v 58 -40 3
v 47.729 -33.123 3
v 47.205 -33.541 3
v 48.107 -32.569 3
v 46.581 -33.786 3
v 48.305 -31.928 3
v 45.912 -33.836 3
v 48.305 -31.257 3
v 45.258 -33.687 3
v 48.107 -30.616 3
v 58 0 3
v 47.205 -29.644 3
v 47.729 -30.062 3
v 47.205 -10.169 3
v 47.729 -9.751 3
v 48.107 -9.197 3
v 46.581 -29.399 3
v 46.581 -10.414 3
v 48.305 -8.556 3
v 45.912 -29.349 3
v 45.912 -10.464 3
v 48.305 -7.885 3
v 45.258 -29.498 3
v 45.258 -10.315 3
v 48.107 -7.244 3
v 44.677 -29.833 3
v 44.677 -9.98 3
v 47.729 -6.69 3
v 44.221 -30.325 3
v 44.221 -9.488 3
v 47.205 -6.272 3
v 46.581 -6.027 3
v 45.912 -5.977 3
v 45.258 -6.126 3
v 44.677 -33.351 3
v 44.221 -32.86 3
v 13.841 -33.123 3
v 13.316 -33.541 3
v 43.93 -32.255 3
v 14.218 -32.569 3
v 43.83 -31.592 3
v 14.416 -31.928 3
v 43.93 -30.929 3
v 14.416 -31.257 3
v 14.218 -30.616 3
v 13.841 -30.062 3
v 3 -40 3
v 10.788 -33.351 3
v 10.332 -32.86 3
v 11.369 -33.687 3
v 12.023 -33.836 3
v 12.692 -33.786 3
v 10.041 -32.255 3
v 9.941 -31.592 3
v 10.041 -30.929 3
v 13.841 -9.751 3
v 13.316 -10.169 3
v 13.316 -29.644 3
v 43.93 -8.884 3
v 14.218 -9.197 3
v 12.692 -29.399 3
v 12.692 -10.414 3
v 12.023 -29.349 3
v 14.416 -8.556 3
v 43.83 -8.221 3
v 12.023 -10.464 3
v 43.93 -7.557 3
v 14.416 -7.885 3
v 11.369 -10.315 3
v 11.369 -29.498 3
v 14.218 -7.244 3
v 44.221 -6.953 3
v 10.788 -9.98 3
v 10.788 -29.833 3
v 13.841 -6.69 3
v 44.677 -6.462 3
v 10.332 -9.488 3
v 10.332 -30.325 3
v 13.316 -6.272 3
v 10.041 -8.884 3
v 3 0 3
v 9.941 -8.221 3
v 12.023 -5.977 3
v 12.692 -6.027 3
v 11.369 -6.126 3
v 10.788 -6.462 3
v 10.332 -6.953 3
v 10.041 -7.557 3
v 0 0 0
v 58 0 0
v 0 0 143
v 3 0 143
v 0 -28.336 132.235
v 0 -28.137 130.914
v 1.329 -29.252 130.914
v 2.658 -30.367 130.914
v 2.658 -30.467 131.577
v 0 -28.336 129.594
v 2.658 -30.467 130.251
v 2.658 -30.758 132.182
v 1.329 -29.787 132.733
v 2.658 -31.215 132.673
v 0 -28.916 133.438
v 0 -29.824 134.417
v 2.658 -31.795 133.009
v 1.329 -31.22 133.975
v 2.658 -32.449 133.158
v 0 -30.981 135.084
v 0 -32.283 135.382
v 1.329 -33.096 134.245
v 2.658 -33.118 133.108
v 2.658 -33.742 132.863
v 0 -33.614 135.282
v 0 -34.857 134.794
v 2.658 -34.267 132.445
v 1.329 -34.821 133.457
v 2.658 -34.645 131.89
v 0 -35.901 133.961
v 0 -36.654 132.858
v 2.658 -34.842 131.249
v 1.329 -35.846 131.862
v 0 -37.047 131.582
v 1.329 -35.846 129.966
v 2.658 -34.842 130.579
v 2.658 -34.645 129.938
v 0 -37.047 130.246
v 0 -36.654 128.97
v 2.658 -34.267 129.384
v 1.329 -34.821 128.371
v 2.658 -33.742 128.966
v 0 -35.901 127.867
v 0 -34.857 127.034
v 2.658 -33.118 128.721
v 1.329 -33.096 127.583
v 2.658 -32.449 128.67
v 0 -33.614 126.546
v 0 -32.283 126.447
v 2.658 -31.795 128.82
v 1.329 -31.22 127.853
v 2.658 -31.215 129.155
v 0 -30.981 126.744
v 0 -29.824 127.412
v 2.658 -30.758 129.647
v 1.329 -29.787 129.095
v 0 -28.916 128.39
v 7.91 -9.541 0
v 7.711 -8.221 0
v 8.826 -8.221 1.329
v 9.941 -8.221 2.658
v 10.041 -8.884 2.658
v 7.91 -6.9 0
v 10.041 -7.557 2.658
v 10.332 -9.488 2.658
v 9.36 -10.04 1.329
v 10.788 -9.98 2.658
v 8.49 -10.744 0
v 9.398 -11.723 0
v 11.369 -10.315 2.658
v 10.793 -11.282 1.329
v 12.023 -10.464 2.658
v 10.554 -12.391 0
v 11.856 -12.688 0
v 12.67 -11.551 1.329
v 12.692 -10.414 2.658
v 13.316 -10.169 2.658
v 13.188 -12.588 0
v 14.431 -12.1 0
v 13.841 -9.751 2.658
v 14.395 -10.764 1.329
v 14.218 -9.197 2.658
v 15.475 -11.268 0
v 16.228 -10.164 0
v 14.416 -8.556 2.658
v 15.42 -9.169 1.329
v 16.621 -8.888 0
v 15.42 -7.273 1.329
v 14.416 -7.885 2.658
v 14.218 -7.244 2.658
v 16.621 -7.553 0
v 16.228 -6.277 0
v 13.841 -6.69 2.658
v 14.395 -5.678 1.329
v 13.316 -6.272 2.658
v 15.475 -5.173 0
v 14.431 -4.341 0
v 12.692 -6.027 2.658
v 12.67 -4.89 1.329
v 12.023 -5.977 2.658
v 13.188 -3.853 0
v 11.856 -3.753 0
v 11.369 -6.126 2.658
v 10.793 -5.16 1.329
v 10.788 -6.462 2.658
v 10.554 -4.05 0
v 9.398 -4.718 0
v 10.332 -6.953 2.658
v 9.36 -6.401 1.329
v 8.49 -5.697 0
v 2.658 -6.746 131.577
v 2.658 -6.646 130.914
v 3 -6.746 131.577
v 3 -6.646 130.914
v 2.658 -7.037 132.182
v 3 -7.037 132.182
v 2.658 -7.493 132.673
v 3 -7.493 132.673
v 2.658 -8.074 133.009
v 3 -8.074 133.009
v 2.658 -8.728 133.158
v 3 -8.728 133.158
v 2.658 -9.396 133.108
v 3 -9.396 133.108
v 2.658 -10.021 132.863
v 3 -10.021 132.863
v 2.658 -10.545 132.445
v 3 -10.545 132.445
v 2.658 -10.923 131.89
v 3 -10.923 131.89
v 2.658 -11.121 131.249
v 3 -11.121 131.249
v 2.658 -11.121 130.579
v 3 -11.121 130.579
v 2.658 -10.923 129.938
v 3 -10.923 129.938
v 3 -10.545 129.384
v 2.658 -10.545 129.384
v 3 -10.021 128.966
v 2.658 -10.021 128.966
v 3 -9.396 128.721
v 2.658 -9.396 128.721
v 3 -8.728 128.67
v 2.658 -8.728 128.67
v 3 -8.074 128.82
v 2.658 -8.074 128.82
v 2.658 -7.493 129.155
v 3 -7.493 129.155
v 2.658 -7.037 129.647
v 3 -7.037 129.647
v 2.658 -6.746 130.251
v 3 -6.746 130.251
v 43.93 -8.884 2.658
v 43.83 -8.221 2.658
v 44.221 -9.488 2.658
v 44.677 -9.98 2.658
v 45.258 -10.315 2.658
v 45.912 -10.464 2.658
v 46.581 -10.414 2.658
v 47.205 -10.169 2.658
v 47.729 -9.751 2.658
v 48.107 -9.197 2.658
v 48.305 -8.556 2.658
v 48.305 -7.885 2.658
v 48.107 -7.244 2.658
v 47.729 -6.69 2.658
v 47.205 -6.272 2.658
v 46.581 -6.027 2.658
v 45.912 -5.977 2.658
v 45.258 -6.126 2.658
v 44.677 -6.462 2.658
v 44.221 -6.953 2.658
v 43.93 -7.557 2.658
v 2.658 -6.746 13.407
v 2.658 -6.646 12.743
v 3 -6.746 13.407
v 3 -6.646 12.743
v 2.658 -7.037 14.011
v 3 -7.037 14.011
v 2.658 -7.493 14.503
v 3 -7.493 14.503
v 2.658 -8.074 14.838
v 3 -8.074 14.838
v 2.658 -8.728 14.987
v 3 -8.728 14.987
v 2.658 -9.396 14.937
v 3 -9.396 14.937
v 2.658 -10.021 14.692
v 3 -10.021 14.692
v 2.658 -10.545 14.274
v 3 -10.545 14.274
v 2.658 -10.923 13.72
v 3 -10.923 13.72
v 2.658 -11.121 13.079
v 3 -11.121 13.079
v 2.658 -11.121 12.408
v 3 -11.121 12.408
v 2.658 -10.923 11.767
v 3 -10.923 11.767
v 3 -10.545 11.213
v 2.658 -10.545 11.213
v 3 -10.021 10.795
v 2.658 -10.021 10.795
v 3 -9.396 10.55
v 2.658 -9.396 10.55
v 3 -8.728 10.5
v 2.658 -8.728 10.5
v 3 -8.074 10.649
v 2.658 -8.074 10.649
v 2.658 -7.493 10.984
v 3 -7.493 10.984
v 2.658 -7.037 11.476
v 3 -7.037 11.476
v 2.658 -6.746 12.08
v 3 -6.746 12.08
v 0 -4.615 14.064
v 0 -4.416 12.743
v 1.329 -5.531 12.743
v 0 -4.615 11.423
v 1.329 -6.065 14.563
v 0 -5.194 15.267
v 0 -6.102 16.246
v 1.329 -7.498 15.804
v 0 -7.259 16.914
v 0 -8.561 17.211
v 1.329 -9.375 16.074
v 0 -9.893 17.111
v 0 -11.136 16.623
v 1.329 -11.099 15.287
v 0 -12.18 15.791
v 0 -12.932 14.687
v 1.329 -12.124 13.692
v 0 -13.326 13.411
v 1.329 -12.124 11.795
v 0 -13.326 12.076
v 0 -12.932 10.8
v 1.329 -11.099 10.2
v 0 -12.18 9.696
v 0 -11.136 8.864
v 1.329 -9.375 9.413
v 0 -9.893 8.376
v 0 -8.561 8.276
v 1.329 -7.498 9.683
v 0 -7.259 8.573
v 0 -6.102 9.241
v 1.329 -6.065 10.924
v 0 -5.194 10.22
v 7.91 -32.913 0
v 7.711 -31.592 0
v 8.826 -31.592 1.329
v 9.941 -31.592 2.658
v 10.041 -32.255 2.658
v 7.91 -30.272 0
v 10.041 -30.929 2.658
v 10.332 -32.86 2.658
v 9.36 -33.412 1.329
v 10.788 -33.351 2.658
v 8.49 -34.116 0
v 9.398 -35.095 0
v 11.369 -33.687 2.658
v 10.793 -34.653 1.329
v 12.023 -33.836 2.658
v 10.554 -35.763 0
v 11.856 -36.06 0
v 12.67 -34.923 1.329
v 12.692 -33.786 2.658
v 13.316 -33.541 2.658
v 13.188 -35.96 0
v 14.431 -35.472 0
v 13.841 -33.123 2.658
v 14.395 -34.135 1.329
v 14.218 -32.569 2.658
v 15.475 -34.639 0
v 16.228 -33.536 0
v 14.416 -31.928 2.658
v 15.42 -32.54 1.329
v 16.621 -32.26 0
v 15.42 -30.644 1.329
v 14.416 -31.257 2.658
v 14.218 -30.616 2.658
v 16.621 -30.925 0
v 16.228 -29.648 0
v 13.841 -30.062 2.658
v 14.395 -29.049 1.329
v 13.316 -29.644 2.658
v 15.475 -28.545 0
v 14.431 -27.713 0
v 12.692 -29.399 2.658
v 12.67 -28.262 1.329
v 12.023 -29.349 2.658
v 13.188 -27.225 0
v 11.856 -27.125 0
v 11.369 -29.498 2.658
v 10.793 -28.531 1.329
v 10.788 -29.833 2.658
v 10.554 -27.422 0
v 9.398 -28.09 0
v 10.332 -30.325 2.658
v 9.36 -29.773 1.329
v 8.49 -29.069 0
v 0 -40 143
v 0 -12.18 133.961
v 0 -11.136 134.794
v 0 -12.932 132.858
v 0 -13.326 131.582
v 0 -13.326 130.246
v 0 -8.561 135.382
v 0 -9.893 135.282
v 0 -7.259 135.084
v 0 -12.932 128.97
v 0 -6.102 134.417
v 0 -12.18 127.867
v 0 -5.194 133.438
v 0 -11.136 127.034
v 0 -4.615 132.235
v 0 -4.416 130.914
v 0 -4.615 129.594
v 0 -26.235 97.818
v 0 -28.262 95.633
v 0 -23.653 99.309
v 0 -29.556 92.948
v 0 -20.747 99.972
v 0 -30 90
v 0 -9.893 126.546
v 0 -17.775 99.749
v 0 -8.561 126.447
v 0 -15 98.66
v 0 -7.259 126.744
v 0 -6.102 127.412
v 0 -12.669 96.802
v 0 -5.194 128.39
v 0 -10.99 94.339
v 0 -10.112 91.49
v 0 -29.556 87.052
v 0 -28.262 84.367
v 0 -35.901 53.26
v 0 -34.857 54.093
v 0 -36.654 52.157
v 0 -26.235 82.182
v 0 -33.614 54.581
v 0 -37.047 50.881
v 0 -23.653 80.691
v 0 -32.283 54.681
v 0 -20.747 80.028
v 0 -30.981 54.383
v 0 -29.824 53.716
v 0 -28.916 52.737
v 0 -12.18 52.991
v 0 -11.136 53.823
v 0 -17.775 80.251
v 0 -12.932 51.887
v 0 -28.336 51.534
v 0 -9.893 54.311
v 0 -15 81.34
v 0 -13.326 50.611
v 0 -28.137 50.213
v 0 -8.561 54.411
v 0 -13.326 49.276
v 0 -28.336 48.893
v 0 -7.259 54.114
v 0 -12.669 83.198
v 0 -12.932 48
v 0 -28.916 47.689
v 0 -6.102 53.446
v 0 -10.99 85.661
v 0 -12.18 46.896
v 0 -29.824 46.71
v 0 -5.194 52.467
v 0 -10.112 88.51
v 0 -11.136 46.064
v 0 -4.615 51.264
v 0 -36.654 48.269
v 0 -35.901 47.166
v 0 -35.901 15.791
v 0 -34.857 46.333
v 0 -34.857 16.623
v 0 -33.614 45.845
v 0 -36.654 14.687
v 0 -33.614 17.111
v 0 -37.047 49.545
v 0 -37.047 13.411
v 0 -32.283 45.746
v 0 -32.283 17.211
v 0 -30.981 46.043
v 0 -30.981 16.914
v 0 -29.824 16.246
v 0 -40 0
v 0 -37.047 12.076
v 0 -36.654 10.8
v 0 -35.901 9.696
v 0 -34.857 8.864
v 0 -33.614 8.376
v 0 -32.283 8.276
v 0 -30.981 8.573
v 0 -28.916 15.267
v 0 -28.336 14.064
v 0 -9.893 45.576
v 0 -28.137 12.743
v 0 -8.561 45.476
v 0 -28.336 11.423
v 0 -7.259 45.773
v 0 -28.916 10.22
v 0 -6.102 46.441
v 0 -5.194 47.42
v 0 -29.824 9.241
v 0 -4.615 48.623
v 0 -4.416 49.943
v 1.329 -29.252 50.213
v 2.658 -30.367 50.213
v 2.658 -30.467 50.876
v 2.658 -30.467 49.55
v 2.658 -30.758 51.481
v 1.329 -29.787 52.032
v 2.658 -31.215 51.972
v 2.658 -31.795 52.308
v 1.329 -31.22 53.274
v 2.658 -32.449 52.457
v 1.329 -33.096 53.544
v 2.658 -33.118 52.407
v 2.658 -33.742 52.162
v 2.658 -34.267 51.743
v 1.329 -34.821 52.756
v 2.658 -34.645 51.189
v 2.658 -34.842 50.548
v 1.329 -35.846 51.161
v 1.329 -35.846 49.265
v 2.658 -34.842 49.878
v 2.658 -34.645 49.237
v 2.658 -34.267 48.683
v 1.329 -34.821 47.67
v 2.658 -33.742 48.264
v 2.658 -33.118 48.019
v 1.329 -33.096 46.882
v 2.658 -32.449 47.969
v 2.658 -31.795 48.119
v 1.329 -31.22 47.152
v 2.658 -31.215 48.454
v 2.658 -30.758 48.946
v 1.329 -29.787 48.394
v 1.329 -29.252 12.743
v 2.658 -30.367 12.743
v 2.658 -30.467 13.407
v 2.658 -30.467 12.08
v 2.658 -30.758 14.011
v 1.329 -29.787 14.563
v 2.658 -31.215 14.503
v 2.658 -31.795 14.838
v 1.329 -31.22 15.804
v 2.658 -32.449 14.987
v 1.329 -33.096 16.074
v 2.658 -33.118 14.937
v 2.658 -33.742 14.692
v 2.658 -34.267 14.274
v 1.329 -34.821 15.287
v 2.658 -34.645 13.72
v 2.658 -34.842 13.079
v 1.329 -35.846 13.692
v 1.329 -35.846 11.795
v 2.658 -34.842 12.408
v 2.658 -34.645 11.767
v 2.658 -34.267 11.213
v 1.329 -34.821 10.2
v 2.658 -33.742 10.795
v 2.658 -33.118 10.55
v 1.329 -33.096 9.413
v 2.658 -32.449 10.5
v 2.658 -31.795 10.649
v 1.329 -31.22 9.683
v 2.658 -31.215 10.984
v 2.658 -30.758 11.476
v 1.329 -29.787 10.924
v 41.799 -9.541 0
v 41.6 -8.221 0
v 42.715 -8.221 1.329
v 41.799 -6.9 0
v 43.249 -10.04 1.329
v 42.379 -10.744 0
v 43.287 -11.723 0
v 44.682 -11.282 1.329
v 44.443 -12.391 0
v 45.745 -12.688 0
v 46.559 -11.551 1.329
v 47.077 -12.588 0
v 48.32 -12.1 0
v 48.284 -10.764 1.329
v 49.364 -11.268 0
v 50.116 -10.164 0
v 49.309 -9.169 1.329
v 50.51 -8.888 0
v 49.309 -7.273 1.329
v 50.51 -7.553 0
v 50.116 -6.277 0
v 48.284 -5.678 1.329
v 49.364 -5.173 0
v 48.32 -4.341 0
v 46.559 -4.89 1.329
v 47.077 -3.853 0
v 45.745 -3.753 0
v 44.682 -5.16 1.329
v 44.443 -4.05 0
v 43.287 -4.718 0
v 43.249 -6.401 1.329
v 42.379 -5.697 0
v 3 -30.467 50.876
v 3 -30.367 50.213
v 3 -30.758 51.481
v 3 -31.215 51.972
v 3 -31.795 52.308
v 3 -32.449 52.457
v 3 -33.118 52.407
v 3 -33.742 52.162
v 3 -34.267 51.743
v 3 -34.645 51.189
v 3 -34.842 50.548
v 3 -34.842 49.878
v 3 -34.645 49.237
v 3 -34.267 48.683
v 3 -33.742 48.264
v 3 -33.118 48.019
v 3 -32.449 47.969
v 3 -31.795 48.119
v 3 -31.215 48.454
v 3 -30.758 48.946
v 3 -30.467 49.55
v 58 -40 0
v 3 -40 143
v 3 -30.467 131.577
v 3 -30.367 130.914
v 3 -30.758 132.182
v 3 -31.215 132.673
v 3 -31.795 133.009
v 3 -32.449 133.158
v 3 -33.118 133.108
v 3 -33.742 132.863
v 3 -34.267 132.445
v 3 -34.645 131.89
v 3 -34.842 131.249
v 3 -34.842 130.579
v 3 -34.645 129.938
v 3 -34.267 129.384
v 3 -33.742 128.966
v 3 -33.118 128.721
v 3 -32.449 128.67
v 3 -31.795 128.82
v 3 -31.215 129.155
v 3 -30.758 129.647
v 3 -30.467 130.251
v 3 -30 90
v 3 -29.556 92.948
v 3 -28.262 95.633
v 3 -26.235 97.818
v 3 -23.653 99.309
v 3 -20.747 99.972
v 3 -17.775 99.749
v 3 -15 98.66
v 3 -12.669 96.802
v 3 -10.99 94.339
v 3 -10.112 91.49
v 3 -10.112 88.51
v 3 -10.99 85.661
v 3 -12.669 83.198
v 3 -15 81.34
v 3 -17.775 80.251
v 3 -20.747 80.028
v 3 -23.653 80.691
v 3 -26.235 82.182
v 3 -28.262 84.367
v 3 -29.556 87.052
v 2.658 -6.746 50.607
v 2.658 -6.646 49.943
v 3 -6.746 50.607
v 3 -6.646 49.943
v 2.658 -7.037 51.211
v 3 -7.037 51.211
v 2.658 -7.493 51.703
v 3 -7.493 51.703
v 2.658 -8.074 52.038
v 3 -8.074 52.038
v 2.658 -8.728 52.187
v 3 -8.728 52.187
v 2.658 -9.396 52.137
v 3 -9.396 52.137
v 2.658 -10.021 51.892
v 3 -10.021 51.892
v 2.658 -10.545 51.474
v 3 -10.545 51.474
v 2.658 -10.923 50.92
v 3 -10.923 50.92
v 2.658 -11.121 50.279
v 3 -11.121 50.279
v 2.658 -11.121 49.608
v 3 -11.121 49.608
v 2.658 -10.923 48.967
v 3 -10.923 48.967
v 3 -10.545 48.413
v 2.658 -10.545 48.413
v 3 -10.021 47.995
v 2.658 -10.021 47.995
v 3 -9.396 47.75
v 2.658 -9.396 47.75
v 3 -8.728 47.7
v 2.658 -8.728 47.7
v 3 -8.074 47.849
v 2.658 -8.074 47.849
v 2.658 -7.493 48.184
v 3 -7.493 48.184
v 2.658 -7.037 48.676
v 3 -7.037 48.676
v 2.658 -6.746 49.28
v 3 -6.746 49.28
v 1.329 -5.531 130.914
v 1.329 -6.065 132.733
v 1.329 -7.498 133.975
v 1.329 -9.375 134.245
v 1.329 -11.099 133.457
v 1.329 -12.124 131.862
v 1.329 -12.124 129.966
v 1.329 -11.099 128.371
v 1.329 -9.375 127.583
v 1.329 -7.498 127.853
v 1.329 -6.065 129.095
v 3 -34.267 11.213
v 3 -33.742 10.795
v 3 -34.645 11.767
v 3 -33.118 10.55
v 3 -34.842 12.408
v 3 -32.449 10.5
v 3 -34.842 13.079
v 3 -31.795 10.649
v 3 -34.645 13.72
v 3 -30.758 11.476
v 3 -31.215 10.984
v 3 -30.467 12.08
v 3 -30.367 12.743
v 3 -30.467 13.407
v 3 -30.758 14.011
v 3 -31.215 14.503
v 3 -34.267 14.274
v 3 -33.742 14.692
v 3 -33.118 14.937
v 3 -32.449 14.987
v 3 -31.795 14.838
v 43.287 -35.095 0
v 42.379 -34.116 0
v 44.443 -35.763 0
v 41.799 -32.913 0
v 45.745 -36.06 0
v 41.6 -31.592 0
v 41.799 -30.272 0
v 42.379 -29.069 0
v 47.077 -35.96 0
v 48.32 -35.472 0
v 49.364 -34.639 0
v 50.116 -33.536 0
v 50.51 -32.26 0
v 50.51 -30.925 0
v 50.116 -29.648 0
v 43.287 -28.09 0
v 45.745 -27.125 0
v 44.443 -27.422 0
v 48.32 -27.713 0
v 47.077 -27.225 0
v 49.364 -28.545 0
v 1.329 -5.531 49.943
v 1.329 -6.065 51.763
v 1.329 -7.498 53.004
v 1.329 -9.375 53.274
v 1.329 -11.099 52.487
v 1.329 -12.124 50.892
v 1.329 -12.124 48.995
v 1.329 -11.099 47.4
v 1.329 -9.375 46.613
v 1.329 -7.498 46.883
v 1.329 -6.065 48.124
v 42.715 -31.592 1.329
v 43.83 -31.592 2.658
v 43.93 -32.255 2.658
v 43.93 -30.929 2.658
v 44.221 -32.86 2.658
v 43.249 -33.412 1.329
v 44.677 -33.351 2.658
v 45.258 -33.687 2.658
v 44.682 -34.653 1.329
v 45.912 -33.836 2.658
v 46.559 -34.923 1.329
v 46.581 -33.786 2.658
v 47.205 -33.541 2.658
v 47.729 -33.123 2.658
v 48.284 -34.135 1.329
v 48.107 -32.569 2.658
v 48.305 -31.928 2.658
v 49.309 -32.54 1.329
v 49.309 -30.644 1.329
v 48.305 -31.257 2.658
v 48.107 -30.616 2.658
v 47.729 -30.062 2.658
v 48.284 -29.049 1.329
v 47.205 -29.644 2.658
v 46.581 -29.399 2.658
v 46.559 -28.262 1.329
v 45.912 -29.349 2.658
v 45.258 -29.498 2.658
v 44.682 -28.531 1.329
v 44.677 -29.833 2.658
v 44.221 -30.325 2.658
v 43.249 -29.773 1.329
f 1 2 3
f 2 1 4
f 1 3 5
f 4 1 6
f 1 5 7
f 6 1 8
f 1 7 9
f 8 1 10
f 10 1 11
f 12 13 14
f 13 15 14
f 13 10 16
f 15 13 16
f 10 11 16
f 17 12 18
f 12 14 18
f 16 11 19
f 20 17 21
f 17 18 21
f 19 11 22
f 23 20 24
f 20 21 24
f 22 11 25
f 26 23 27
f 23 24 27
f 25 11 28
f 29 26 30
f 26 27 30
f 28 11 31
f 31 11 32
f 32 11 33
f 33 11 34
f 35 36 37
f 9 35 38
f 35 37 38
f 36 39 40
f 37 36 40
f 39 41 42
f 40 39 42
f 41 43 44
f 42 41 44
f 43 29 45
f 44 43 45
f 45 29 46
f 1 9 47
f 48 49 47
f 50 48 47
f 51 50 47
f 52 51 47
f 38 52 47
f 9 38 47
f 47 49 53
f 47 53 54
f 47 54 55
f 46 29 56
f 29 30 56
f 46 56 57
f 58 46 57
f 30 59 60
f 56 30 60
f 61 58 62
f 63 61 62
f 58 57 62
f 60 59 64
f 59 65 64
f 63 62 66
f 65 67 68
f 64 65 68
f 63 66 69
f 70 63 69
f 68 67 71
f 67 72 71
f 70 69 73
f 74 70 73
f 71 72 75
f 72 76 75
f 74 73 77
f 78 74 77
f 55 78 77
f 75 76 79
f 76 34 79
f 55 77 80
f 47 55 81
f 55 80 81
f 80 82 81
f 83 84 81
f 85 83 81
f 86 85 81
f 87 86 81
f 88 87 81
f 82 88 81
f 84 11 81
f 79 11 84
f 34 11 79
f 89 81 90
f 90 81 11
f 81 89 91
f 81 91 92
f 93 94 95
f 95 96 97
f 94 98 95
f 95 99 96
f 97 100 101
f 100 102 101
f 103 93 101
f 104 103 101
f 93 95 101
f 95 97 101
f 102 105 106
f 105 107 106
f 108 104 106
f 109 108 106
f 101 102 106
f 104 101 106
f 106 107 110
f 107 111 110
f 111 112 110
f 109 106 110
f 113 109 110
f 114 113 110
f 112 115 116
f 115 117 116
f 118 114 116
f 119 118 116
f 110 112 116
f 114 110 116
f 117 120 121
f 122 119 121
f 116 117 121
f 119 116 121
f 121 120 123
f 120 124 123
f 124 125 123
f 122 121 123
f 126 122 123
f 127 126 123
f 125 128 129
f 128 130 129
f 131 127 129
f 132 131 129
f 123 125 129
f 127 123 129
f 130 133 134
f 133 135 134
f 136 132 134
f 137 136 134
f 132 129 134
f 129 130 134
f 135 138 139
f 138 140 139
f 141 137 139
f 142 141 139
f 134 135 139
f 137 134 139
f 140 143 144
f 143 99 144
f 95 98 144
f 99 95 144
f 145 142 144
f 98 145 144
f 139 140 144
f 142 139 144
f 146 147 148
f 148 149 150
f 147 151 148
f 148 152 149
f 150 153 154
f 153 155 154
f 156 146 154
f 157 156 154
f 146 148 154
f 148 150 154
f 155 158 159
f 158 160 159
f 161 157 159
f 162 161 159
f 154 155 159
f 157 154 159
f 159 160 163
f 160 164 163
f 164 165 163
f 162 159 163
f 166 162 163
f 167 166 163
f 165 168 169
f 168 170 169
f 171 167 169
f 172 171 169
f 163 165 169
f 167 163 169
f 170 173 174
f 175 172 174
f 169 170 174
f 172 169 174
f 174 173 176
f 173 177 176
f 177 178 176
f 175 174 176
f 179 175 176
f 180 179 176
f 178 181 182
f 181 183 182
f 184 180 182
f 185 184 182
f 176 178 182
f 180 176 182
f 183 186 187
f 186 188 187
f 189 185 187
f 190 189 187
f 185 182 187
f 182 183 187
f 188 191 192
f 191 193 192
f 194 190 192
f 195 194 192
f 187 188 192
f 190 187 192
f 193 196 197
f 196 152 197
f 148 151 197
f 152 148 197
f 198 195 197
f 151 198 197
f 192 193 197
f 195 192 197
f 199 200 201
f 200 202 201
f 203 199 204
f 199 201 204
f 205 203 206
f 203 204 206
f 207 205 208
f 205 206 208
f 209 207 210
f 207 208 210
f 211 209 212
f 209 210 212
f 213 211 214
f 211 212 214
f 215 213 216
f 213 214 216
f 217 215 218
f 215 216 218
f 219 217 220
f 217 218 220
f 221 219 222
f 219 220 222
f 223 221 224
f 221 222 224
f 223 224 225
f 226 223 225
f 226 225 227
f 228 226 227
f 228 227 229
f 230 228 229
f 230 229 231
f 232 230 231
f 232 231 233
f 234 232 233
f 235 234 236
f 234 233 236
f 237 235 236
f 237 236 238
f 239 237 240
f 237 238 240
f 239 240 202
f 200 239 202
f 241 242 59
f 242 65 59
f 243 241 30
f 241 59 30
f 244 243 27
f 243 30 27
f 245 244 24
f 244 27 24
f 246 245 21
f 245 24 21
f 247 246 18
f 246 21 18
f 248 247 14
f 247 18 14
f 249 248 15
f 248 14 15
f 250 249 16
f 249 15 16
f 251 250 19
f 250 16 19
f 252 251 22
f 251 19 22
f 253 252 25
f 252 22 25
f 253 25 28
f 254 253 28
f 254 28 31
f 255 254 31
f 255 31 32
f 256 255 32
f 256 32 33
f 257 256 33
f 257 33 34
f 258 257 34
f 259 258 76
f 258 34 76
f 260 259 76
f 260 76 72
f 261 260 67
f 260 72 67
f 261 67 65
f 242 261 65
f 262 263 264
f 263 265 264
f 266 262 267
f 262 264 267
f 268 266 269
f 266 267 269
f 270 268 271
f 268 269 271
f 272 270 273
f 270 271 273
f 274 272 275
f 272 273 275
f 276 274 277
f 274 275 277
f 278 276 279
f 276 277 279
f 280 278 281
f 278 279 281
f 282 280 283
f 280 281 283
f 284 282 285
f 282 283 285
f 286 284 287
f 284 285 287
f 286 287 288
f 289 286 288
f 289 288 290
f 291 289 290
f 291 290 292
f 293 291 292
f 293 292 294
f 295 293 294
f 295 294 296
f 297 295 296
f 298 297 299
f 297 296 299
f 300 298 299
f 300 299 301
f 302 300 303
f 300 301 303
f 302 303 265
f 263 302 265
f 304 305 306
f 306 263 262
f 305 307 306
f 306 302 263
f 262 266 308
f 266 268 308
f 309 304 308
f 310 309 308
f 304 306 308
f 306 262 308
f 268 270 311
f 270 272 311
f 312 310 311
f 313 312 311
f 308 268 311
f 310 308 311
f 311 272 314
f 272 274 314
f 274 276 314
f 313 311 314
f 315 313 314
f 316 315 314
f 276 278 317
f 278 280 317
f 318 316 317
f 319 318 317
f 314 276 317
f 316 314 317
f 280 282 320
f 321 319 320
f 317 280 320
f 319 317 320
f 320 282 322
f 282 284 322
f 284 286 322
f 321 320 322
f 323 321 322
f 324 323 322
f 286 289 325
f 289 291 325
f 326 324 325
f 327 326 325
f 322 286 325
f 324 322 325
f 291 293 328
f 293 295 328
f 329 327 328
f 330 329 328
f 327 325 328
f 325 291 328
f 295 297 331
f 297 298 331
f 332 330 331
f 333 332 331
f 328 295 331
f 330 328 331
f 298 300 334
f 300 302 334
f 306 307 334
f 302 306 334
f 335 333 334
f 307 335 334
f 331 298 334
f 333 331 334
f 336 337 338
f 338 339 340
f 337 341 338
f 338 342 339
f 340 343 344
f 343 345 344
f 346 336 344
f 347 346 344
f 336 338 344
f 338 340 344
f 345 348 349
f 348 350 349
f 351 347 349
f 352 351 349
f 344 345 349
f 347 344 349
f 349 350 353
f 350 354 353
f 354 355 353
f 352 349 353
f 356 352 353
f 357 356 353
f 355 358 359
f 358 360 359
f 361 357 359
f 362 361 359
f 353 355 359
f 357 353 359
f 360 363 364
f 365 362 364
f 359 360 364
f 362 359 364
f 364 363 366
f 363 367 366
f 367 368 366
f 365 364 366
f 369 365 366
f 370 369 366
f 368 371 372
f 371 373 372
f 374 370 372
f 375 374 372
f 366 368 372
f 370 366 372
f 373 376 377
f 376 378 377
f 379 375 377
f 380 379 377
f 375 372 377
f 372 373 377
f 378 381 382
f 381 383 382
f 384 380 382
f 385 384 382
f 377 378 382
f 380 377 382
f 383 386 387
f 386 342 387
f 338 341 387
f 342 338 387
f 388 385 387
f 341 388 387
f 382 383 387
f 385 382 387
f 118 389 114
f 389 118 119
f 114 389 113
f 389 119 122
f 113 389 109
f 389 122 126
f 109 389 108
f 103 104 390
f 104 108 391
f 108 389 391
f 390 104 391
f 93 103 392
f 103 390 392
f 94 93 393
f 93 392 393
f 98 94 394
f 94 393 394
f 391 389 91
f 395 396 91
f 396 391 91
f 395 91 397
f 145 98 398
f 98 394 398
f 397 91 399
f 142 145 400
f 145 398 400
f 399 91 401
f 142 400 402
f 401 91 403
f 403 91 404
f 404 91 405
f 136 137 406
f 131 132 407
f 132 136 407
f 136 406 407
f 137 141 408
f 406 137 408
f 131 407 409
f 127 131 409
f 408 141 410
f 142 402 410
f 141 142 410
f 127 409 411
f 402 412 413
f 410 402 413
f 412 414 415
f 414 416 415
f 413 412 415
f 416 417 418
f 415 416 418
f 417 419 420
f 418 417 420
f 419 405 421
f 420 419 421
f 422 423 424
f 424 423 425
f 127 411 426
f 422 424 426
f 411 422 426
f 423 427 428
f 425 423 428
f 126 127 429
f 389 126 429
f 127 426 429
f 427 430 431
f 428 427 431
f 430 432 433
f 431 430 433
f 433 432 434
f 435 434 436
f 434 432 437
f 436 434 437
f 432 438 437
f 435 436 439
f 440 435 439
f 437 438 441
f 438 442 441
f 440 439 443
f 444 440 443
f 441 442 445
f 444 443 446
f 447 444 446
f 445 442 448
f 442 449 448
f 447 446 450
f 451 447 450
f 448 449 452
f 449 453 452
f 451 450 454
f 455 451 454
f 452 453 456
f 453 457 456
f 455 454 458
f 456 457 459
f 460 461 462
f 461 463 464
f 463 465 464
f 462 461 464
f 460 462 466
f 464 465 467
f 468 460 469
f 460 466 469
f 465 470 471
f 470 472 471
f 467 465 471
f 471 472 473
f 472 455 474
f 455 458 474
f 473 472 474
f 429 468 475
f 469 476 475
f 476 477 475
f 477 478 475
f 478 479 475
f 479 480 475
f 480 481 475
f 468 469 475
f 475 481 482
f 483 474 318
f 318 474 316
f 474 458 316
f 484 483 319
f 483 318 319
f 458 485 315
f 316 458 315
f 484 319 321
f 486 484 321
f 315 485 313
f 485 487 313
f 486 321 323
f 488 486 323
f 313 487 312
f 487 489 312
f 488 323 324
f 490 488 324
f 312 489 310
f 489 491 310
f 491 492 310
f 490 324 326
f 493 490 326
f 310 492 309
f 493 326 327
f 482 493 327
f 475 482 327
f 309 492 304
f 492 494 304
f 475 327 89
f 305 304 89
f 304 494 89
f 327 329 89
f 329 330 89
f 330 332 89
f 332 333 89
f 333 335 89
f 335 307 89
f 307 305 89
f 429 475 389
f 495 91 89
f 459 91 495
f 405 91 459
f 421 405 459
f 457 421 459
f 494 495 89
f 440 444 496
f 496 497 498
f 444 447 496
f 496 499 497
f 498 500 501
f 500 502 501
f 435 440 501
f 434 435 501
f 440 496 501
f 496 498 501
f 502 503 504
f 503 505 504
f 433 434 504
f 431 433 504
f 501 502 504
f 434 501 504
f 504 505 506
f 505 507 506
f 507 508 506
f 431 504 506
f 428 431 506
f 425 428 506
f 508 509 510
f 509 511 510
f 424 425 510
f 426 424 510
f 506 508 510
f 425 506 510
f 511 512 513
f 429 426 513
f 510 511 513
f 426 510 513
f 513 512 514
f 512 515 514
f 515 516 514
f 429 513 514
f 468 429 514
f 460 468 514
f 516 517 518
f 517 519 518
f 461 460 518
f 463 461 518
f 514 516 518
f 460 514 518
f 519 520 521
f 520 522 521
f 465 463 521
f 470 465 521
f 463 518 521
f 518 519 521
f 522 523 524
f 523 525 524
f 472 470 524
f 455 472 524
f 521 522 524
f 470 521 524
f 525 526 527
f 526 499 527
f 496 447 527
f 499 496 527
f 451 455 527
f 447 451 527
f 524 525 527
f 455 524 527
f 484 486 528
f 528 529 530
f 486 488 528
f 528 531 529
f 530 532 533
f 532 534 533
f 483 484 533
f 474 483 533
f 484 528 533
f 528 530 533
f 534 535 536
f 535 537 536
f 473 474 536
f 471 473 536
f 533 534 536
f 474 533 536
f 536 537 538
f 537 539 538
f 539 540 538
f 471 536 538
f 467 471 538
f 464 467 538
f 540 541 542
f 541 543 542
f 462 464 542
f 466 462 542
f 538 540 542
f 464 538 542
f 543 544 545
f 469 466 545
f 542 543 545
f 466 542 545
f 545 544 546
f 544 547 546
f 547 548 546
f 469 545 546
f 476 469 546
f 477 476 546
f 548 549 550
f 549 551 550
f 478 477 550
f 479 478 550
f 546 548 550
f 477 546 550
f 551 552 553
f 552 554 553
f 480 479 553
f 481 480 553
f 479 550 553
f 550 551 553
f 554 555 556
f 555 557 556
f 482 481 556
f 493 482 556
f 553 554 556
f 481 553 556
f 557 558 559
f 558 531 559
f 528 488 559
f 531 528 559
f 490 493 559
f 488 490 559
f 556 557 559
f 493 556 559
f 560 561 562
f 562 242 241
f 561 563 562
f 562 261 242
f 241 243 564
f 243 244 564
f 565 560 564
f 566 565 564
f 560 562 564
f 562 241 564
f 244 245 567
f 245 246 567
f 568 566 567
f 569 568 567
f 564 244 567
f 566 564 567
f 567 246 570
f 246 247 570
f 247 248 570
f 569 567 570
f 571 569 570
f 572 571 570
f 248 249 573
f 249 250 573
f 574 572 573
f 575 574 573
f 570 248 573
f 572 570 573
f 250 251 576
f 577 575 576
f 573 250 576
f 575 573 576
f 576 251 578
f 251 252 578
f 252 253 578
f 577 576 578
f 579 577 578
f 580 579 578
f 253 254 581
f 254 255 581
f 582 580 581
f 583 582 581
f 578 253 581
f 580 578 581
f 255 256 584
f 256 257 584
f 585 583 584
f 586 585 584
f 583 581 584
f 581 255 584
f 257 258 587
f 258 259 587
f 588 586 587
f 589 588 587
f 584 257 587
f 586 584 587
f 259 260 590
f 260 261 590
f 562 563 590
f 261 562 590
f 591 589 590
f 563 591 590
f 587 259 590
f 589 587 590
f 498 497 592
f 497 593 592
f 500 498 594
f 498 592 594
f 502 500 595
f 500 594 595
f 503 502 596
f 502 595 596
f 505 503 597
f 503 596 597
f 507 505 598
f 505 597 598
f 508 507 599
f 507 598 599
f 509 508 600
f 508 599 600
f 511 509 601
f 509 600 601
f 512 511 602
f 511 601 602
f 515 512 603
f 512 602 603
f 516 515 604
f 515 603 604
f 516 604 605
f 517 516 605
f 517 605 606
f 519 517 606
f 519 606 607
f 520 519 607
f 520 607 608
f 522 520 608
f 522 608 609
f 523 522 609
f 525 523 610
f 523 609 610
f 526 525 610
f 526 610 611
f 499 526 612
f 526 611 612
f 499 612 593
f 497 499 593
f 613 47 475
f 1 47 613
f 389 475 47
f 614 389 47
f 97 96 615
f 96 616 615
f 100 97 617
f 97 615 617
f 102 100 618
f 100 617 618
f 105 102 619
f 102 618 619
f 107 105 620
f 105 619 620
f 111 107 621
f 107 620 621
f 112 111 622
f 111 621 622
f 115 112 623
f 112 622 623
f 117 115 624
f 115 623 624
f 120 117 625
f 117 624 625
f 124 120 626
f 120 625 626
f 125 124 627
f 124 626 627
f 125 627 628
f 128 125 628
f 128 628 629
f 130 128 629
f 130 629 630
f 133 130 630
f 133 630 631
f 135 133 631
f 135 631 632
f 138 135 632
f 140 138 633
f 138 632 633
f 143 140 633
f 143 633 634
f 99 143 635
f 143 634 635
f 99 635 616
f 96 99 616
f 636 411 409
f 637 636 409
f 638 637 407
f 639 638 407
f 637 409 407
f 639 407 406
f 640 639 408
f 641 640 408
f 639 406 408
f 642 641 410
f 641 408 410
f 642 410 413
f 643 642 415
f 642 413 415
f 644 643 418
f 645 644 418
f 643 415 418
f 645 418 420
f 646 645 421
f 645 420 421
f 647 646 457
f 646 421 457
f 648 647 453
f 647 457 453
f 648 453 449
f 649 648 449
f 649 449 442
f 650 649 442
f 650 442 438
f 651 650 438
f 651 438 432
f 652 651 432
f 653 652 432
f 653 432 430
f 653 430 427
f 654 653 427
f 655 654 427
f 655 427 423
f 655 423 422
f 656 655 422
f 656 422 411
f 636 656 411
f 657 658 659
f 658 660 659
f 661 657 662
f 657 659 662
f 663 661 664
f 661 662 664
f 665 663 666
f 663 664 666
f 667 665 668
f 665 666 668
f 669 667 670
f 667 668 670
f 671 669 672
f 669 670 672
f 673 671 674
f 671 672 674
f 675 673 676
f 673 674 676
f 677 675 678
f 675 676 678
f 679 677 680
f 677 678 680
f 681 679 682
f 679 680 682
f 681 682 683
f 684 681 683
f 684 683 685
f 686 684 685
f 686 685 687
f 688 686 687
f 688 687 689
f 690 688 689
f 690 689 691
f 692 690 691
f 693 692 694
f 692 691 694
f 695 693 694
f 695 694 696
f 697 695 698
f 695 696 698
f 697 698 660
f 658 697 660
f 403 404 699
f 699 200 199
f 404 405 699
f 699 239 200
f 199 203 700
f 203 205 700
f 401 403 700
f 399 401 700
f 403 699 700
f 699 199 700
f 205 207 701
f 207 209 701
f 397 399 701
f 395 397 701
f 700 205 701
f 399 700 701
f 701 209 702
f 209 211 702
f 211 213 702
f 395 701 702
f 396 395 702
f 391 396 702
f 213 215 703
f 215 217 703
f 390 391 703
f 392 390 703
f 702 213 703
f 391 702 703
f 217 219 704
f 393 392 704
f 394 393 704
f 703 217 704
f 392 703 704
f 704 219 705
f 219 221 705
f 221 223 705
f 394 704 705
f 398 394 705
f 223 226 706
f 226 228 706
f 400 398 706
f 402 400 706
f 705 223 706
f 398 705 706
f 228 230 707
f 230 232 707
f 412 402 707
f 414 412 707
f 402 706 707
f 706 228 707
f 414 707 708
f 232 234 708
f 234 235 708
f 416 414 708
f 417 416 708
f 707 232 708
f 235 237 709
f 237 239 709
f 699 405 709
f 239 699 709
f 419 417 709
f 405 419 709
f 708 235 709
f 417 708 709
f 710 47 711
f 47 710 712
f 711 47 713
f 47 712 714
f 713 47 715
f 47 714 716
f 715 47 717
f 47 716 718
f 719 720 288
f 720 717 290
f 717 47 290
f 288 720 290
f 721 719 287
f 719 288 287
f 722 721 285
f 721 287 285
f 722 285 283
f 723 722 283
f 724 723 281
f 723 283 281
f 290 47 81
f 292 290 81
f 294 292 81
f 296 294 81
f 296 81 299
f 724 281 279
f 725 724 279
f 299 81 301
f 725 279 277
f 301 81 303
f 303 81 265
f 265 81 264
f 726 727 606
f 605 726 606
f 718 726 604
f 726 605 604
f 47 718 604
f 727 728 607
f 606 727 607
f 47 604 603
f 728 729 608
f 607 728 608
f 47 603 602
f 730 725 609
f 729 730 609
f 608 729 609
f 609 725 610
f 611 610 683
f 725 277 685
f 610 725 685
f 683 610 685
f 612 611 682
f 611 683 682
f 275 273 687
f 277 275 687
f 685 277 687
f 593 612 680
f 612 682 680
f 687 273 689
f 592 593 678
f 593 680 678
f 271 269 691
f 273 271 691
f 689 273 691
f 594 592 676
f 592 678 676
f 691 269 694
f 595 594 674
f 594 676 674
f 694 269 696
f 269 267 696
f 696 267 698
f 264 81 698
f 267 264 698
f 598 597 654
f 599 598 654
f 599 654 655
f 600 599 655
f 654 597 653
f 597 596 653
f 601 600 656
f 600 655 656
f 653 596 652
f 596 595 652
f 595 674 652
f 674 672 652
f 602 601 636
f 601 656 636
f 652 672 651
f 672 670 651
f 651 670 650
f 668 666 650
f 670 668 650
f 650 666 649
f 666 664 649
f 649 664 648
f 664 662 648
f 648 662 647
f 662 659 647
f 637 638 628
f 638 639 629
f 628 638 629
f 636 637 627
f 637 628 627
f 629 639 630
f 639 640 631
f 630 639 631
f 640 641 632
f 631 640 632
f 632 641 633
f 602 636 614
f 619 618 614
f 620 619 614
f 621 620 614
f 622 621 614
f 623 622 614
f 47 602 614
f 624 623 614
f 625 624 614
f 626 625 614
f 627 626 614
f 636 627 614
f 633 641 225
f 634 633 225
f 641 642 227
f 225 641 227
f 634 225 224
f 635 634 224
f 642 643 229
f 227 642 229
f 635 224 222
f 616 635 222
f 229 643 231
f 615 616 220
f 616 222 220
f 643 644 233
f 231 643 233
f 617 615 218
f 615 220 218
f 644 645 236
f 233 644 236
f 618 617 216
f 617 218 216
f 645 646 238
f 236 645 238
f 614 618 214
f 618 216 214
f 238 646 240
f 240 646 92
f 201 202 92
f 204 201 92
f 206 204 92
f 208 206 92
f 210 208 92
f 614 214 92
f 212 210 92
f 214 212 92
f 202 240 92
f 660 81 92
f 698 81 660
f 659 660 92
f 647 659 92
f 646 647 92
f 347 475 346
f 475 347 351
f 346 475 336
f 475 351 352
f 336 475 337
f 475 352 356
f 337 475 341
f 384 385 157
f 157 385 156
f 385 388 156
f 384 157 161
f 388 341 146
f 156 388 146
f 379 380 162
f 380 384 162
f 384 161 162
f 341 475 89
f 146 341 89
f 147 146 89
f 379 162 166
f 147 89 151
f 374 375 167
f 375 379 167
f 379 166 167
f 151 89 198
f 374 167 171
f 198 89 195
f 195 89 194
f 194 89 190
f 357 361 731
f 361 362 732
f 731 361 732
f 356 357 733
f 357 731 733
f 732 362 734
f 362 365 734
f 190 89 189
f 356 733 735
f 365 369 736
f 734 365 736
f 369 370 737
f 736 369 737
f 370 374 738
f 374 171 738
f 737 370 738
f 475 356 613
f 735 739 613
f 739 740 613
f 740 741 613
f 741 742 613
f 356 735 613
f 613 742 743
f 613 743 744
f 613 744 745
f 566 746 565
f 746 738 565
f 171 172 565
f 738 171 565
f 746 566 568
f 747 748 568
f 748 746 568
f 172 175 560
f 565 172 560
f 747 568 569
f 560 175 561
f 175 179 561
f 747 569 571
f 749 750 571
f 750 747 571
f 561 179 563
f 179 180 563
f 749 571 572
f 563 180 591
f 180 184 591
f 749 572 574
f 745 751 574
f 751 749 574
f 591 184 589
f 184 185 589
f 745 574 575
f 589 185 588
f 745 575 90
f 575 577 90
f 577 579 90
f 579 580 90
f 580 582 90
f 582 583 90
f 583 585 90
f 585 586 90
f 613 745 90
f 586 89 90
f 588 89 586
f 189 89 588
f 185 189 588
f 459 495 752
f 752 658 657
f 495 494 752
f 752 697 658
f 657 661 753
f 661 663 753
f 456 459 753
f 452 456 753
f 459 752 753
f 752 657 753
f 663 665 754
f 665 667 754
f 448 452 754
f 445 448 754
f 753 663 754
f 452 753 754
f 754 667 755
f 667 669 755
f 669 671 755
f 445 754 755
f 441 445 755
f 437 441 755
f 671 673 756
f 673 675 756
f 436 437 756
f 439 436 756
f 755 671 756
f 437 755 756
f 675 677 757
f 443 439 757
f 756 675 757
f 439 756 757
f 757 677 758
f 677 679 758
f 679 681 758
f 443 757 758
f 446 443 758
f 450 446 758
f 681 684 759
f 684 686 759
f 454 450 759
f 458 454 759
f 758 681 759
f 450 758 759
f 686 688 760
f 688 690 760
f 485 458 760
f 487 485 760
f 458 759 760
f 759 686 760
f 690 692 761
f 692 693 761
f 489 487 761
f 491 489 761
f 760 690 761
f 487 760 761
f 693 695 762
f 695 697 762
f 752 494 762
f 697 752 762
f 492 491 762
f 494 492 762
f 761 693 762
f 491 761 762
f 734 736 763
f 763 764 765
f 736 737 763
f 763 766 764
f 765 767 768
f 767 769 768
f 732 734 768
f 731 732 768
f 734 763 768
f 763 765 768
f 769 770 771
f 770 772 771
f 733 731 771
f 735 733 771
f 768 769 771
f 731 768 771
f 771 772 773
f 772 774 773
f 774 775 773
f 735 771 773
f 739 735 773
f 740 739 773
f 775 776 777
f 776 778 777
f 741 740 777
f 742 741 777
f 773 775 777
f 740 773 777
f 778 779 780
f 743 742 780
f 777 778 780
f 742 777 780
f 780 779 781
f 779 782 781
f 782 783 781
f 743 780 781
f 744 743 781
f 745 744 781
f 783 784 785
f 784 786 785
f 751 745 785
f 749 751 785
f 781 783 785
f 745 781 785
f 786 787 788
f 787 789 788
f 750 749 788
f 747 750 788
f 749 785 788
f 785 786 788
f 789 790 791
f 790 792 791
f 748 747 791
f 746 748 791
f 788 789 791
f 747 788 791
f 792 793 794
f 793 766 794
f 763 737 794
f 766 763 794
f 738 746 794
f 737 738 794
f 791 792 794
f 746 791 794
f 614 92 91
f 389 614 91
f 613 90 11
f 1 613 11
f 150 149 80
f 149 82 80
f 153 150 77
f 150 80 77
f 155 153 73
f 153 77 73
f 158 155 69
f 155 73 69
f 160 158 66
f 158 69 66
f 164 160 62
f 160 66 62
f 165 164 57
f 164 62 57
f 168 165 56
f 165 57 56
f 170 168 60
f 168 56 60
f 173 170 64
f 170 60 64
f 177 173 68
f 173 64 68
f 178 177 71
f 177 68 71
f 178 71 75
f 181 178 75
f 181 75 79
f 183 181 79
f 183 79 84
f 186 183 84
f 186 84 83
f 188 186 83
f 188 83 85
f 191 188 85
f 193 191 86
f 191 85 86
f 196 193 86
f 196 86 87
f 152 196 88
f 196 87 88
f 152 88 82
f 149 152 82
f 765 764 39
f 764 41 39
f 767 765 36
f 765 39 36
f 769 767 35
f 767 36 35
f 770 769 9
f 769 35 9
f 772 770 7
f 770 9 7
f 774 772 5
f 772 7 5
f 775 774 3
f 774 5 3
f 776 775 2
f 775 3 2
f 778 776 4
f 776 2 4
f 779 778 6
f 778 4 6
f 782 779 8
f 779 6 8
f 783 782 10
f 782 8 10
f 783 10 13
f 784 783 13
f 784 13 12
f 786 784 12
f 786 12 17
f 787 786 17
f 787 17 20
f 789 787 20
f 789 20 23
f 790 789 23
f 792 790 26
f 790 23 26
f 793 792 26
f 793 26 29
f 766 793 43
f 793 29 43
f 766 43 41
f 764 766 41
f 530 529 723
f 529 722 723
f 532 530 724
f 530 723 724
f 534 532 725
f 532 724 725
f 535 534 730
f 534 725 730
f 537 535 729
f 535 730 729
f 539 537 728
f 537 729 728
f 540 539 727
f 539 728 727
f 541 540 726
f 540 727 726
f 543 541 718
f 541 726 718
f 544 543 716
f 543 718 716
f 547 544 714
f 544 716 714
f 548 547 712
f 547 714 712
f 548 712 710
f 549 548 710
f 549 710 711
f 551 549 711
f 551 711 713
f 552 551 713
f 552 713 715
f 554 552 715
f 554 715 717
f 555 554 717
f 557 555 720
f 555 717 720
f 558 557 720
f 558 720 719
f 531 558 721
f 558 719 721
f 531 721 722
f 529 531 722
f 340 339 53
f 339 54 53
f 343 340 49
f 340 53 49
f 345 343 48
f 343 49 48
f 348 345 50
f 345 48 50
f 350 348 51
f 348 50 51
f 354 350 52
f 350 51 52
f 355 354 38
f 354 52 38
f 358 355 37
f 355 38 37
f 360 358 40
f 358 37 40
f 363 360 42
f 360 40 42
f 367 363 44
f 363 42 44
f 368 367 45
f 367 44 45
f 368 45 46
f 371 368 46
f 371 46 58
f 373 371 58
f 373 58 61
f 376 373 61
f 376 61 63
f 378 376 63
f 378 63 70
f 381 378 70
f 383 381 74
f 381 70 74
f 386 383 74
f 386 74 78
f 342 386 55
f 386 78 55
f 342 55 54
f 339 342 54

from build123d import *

# Parameters (mm, degrees)
F1_DEPTH       = 40
F3_R           = 10
F4_DEPTH       = 58.001
F6_D           = 4.5
F6_CSINK_D     = 8.96
F6_CSINK_ANGLE = 80
F7_D           = 4.5
F7_CSINK_D     = 8.96
F7_CSINK_ANGLE = 80


# Not quite as in the source:
# - a feature names something its author has since deleted; it is built from what else it names


with BuildPart() as f1:
    # F0 (on Front) → F1 (new body)
    with BuildSketch(Plane.XZ):
        Polygon((3, 143), (0, 143), (0, 0), (58, 0), (58, 3), (3, 3), align=None)
    extrude(amount=F1_DEPTH)

    # F3 (on face) → F4 (cut, through all)
    with BuildSketch(Plane(origin=(0, 0, 0), x_dir=(0, -1, 0), z_dir=(-1, 0, 0))):
        with Locations((20, 90)):
            Circle(F3_R)
    extrude(amount=-F4_DEPTH, mode=Mode.SUBTRACT)

    # F6 (through all)
    with Locations(Plane(origin=(0, 0, 0), x_dir=(0, -1, 0), z_dir=(-1, 0, 0))):
        with Locations((32.6173938811, 50.2130389214), (32.6173938811, 12.7434721217), (8.8956523687, 12.7434721217), (8.8956523687, 49.9434731901), (32.6173938811, 130.9141218662), (8.8956523687, 130.9141218662)):
            CounterSinkHole(F6_D / 2, F6_CSINK_D / 2, counter_sink_angle=F6_CSINK_ANGLE)

    # F7 (through all)
    with Locations(Plane(origin=(0, 0, 0), x_dir=(1, 0, 0), z_dir=(0, 0, -1))):
        with Locations((46.0800911891, 8.2206267661), (12.191168997, 8.2206267661), (12.191168997, 31.5922972435), (46.0800911891, 31.5922972435)):
            CounterSinkHole(F7_D / 2, F7_CSINK_D / 2, counter_sink_angle=F7_CSINK_ANGLE)


solid = f1.part
